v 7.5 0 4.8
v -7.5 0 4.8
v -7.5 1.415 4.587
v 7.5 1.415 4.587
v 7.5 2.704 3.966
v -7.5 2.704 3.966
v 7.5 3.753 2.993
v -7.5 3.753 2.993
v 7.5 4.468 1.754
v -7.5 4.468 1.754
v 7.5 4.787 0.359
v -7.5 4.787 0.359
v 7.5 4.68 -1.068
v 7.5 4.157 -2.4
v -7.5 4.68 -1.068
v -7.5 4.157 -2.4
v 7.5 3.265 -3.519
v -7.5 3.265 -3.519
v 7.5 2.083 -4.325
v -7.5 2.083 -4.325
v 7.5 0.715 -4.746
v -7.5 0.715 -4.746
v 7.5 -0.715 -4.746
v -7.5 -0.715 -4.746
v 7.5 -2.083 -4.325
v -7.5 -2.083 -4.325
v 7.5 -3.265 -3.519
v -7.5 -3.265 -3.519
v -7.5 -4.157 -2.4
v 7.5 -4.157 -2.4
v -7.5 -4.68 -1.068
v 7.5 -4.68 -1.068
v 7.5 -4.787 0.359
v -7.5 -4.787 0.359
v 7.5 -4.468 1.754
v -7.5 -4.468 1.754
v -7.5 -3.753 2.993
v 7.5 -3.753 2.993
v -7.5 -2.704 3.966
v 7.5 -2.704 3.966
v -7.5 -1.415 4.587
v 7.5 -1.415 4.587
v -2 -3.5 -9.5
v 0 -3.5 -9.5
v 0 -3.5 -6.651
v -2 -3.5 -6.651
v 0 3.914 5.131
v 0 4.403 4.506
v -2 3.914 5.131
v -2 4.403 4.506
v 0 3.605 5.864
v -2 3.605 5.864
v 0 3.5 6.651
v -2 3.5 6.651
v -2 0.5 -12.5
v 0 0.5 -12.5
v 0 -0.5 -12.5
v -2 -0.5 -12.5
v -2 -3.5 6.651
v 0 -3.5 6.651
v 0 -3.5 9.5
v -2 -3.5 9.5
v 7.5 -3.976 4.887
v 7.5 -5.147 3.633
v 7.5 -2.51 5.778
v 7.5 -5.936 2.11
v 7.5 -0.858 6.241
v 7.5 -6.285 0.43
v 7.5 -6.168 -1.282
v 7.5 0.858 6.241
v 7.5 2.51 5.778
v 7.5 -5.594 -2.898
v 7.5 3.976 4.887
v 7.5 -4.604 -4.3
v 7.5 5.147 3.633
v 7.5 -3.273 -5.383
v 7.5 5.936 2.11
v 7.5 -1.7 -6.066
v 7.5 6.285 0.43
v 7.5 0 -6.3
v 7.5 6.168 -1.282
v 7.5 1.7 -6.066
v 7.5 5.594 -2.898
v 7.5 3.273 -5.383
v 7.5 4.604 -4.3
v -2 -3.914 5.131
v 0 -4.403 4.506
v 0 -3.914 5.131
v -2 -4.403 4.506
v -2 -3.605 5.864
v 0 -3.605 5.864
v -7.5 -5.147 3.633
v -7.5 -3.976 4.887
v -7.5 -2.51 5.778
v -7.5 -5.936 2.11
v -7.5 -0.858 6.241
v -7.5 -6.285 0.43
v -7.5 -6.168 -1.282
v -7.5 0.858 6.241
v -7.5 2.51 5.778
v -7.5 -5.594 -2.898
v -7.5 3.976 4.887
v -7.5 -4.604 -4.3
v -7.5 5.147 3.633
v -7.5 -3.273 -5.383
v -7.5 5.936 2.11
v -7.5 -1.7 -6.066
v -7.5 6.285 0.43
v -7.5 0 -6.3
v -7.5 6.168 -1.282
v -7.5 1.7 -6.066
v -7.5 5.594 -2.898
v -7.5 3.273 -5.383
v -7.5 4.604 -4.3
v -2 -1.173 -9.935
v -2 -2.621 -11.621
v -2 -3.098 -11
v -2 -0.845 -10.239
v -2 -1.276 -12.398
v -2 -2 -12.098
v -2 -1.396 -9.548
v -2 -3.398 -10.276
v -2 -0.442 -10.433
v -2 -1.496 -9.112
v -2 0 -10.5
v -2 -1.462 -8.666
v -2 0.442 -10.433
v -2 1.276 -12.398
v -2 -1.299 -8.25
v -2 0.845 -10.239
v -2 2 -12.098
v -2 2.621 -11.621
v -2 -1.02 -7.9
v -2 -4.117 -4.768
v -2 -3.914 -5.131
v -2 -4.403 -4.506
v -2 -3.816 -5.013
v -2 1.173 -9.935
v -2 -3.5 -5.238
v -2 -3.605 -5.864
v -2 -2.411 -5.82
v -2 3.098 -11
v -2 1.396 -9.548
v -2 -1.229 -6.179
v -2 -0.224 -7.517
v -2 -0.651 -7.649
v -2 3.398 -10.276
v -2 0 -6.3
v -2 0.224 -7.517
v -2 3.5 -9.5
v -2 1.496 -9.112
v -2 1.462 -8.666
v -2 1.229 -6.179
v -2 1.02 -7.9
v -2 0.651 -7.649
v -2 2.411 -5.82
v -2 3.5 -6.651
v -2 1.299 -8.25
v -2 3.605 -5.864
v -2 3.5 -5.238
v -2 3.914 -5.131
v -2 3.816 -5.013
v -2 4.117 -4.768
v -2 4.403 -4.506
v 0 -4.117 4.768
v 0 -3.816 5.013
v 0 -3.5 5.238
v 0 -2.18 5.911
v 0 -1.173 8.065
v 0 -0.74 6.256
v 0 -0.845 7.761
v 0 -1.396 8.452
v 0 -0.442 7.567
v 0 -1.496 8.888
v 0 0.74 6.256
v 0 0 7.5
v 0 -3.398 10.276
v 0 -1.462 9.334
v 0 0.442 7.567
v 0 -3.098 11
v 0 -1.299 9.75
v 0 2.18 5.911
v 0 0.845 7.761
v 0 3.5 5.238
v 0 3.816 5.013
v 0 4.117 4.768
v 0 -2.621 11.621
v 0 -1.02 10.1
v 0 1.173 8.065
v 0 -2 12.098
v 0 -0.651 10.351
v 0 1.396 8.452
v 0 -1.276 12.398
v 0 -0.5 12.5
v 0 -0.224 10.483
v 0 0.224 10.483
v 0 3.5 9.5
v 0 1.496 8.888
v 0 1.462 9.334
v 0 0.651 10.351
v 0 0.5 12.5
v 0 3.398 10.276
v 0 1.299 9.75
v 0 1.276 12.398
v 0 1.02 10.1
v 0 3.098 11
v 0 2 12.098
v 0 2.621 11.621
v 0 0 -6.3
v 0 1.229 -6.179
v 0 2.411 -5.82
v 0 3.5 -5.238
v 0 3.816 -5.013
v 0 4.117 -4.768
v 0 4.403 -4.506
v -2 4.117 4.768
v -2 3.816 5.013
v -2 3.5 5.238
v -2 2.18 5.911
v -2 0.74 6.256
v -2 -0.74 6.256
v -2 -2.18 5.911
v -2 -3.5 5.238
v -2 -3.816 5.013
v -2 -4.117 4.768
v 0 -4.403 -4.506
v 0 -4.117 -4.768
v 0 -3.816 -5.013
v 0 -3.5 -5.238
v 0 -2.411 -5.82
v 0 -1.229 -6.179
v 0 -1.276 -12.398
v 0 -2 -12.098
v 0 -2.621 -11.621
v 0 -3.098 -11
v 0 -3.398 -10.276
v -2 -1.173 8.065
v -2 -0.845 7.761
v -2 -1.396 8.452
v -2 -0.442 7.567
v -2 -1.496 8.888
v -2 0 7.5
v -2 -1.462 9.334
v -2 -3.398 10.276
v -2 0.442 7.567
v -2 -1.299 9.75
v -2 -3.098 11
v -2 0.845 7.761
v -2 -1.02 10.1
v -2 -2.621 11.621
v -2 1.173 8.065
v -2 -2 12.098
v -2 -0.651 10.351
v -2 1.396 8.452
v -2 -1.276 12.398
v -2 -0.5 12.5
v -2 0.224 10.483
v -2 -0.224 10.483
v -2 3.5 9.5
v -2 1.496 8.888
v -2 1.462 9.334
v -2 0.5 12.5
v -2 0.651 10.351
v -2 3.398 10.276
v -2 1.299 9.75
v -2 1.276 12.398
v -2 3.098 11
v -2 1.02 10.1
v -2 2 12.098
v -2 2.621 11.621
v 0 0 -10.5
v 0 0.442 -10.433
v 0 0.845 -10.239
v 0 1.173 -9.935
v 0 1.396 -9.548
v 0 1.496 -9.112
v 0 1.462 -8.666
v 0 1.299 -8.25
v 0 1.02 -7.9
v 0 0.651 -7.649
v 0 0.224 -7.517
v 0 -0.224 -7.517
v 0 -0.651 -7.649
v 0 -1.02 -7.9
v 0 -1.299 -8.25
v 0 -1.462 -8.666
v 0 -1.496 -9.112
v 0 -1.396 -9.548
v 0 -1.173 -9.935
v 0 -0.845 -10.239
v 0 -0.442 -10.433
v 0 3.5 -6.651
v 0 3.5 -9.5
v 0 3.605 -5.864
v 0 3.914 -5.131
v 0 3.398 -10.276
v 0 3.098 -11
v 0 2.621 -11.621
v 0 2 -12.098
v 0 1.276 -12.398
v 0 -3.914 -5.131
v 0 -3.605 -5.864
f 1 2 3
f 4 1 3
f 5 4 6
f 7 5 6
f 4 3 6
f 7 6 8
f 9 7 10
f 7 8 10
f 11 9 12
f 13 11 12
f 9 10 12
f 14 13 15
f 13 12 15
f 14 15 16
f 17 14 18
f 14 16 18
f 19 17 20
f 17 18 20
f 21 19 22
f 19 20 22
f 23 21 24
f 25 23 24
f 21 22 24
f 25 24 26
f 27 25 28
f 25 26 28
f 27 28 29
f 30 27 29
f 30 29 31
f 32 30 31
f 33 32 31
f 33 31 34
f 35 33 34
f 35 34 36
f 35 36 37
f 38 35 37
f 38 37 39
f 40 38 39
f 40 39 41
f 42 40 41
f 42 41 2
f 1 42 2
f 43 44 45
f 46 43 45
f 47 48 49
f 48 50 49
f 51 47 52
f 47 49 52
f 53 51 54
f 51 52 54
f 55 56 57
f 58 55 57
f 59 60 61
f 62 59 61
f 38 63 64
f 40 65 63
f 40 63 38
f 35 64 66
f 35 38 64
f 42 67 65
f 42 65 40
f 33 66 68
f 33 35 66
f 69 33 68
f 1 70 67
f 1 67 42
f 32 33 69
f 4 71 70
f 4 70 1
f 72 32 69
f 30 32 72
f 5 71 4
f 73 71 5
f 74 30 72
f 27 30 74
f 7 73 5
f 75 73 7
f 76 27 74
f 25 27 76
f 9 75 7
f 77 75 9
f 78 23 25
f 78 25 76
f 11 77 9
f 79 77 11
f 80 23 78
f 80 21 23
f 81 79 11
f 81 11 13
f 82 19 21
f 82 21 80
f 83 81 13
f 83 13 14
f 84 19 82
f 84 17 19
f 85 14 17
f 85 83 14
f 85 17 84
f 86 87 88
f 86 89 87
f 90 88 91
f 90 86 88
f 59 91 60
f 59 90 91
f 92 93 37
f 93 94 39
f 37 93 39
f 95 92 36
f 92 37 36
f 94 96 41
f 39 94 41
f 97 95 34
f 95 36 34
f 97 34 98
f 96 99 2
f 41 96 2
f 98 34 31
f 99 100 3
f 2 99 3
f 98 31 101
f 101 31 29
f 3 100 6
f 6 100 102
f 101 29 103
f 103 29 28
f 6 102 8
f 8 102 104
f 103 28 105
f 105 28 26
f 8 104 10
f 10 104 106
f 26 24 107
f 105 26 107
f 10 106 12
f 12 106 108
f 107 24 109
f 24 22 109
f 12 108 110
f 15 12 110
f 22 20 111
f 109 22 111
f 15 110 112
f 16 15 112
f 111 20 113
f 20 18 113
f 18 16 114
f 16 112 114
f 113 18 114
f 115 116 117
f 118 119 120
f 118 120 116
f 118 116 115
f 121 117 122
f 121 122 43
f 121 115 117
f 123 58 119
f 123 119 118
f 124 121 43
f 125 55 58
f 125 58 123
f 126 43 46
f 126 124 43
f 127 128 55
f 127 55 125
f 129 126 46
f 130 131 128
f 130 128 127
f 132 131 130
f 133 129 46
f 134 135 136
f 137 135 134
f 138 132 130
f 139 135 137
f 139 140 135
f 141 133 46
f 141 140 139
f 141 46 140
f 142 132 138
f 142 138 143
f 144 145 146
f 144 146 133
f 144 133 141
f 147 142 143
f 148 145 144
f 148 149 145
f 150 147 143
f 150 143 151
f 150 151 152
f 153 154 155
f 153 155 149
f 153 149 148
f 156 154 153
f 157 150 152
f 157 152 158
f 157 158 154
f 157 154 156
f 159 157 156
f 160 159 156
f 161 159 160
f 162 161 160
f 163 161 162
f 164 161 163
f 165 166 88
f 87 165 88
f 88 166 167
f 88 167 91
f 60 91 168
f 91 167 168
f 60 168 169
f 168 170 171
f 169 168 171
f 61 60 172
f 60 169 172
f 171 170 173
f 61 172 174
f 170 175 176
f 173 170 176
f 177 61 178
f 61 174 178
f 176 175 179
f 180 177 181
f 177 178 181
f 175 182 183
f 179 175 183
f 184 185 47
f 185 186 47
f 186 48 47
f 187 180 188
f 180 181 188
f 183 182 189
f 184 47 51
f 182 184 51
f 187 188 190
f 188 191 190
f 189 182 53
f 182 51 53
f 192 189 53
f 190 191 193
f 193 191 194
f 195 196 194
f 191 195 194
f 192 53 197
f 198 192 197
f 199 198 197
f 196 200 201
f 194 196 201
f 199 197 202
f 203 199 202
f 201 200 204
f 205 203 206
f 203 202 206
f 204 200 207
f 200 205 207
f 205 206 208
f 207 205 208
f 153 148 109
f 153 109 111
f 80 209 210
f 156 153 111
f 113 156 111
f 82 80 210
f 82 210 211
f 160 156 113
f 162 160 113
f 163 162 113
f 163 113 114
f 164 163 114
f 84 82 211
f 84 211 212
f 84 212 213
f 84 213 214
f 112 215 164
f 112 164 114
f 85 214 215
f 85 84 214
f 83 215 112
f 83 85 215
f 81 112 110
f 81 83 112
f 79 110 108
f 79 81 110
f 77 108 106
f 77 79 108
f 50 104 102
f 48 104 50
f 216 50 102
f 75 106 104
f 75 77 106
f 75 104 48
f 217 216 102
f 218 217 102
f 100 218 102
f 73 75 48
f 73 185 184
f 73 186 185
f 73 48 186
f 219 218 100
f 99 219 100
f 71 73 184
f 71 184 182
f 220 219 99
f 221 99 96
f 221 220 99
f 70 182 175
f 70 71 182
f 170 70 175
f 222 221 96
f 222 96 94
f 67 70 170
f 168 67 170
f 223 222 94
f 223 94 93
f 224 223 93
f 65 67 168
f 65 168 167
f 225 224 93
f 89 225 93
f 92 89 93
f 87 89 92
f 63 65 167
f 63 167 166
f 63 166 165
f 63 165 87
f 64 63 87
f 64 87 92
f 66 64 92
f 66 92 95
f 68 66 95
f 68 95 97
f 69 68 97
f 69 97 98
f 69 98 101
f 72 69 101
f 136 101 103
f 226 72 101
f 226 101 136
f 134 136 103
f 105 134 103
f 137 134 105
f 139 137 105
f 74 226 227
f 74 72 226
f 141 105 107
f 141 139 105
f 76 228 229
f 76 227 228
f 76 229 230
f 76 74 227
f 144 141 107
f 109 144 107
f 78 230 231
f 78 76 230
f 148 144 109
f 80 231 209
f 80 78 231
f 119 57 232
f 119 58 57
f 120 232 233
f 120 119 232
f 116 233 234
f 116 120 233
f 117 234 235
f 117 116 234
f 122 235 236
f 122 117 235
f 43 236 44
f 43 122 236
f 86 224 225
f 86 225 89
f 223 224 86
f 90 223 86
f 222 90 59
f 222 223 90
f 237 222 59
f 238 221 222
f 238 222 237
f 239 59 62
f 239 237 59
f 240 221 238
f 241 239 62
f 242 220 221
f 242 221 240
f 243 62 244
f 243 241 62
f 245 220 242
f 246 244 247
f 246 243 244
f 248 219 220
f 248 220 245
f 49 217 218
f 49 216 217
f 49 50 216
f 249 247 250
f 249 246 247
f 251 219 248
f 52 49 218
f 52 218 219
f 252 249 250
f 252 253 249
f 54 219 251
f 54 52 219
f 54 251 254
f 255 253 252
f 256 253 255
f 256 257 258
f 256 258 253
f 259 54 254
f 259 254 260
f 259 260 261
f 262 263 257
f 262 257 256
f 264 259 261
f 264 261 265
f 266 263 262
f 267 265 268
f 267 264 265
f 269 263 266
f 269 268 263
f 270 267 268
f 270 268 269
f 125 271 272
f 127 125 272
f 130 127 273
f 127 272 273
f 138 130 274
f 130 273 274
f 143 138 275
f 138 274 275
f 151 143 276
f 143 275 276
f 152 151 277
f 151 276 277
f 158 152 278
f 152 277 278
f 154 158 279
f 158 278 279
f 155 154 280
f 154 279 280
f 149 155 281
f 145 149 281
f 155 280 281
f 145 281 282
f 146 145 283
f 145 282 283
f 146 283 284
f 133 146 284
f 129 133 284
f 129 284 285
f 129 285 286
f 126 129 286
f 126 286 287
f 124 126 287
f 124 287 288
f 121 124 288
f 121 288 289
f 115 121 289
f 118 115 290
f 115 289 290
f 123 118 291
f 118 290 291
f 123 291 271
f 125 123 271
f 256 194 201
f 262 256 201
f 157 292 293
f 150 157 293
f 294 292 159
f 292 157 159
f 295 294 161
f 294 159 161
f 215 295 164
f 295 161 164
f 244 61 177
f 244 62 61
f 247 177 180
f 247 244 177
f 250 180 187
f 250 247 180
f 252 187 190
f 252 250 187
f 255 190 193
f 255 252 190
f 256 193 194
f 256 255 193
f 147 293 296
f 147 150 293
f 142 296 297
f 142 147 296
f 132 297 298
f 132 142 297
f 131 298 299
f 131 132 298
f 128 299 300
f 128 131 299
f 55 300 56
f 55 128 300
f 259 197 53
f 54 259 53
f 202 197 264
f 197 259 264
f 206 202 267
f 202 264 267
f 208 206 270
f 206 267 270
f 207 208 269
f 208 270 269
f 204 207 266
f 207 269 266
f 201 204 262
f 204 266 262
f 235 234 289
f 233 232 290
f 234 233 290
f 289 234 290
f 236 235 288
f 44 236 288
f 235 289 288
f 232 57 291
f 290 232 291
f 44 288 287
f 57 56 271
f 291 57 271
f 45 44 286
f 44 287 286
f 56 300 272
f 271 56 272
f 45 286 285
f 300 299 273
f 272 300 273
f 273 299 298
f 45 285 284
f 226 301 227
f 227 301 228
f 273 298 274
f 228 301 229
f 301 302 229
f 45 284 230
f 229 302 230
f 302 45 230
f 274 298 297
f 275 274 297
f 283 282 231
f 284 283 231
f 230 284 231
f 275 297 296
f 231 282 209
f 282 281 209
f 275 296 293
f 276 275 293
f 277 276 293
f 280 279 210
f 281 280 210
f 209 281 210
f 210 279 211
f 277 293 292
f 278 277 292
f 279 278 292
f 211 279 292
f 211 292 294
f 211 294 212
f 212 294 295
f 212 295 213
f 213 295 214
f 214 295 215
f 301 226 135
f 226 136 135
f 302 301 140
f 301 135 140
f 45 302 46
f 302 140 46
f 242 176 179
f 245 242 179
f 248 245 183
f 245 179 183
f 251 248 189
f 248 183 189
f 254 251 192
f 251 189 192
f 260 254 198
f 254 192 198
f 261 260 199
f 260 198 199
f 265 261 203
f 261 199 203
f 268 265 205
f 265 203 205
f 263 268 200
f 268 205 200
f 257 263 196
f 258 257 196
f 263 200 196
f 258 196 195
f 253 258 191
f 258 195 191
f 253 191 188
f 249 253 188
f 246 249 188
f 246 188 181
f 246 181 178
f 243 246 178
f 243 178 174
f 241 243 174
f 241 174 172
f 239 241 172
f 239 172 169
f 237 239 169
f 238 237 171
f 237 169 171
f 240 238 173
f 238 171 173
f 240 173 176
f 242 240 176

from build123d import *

# Parameters (mm, degrees)
SKETCH1_R           = 6.3
BOSS_EXTRUDE1_DEPTH = 7.5
SKETCH26_R          = 1.5
BOSS_EXTRUDE3_DEPTH = 2
FILLET1_R           = 3
SKETCH24_R          = 4.8
CUT_EXTRUDE1_DEPTH  = 16


with BuildPart() as part:
    # Sketch1 → Boss-Extrude1 (new body, symmetric)
    with BuildSketch(Plane(origin=(0, 0, 0), x_dir=(0, 0, -1), z_dir=(1, 0, 0))):
        Circle(SKETCH1_R)
    extrude(amount=BOSS_EXTRUDE1_DEPTH, both=True)

    # Sketch26 → Boss-Extrude3 (add)
    with BuildSketch(Plane(origin=(0, 0, 0), x_dir=(0, 0, -1), z_dir=(1, 0, 0))):
        with BuildLine():
            Line((5.238320341, 3.5), (12.5, 3.5))
            Line((12.5, 3.5), (12.5, -3.5))
            Line((12.5, -3.5), (5.238320341, -3.5))
            ThreePointArc((5.238320341, -3.5), (6.3, 0), (5.238320341, 3.5))
        make_face()
        with Locations((9, 0)):
            Circle(SKETCH26_R, mode=Mode.SUBTRACT)
        with BuildLine():
            Line((-5.238320341, -3.5), (-12.5, -3.5))
            Line((-12.5, -3.5), (-12.5, 3.5))
            Line((-12.5, 3.5), (-5.238320341, 3.5))
            ThreePointArc((-5.238320341, 3.5), (-6.3, 0), (-5.238320341, -3.5))
        make_face()
        with Locations((-9, 0)):
            Circle(SKETCH26_R, mode=Mode.SUBTRACT)
    extrude(amount=-BOSS_EXTRUDE3_DEPTH)

    # Fillet1
    fillet1_edges = [part.edges().sort_by_distance(p)[0] for p in [
        (-1, -3.5, 12.5),
        (-1, 3.5, 12.5),
        (-1, 3.5, 5.238320341),
        (-1, -3.5, 5.238320341),
        (-1, -3.5, -5.238320341),
        (-1, 3.5, -5.238320341),
        (-1, 3.5, -12.5),
        (-1, -3.5, -12.5),
    ]]
    fillet(fillet1_edges, radius=FILLET1_R)

    # Sketch24 → Cut-Extrude1 (cut, through all)
    with BuildSketch(Plane.ZY.offset(7.5)):
        Circle(SKETCH24_R)
    extrude(amount=-CUT_EXTRUDE1_DEPTH, mode=Mode.SUBTRACT)


solid = part.part
